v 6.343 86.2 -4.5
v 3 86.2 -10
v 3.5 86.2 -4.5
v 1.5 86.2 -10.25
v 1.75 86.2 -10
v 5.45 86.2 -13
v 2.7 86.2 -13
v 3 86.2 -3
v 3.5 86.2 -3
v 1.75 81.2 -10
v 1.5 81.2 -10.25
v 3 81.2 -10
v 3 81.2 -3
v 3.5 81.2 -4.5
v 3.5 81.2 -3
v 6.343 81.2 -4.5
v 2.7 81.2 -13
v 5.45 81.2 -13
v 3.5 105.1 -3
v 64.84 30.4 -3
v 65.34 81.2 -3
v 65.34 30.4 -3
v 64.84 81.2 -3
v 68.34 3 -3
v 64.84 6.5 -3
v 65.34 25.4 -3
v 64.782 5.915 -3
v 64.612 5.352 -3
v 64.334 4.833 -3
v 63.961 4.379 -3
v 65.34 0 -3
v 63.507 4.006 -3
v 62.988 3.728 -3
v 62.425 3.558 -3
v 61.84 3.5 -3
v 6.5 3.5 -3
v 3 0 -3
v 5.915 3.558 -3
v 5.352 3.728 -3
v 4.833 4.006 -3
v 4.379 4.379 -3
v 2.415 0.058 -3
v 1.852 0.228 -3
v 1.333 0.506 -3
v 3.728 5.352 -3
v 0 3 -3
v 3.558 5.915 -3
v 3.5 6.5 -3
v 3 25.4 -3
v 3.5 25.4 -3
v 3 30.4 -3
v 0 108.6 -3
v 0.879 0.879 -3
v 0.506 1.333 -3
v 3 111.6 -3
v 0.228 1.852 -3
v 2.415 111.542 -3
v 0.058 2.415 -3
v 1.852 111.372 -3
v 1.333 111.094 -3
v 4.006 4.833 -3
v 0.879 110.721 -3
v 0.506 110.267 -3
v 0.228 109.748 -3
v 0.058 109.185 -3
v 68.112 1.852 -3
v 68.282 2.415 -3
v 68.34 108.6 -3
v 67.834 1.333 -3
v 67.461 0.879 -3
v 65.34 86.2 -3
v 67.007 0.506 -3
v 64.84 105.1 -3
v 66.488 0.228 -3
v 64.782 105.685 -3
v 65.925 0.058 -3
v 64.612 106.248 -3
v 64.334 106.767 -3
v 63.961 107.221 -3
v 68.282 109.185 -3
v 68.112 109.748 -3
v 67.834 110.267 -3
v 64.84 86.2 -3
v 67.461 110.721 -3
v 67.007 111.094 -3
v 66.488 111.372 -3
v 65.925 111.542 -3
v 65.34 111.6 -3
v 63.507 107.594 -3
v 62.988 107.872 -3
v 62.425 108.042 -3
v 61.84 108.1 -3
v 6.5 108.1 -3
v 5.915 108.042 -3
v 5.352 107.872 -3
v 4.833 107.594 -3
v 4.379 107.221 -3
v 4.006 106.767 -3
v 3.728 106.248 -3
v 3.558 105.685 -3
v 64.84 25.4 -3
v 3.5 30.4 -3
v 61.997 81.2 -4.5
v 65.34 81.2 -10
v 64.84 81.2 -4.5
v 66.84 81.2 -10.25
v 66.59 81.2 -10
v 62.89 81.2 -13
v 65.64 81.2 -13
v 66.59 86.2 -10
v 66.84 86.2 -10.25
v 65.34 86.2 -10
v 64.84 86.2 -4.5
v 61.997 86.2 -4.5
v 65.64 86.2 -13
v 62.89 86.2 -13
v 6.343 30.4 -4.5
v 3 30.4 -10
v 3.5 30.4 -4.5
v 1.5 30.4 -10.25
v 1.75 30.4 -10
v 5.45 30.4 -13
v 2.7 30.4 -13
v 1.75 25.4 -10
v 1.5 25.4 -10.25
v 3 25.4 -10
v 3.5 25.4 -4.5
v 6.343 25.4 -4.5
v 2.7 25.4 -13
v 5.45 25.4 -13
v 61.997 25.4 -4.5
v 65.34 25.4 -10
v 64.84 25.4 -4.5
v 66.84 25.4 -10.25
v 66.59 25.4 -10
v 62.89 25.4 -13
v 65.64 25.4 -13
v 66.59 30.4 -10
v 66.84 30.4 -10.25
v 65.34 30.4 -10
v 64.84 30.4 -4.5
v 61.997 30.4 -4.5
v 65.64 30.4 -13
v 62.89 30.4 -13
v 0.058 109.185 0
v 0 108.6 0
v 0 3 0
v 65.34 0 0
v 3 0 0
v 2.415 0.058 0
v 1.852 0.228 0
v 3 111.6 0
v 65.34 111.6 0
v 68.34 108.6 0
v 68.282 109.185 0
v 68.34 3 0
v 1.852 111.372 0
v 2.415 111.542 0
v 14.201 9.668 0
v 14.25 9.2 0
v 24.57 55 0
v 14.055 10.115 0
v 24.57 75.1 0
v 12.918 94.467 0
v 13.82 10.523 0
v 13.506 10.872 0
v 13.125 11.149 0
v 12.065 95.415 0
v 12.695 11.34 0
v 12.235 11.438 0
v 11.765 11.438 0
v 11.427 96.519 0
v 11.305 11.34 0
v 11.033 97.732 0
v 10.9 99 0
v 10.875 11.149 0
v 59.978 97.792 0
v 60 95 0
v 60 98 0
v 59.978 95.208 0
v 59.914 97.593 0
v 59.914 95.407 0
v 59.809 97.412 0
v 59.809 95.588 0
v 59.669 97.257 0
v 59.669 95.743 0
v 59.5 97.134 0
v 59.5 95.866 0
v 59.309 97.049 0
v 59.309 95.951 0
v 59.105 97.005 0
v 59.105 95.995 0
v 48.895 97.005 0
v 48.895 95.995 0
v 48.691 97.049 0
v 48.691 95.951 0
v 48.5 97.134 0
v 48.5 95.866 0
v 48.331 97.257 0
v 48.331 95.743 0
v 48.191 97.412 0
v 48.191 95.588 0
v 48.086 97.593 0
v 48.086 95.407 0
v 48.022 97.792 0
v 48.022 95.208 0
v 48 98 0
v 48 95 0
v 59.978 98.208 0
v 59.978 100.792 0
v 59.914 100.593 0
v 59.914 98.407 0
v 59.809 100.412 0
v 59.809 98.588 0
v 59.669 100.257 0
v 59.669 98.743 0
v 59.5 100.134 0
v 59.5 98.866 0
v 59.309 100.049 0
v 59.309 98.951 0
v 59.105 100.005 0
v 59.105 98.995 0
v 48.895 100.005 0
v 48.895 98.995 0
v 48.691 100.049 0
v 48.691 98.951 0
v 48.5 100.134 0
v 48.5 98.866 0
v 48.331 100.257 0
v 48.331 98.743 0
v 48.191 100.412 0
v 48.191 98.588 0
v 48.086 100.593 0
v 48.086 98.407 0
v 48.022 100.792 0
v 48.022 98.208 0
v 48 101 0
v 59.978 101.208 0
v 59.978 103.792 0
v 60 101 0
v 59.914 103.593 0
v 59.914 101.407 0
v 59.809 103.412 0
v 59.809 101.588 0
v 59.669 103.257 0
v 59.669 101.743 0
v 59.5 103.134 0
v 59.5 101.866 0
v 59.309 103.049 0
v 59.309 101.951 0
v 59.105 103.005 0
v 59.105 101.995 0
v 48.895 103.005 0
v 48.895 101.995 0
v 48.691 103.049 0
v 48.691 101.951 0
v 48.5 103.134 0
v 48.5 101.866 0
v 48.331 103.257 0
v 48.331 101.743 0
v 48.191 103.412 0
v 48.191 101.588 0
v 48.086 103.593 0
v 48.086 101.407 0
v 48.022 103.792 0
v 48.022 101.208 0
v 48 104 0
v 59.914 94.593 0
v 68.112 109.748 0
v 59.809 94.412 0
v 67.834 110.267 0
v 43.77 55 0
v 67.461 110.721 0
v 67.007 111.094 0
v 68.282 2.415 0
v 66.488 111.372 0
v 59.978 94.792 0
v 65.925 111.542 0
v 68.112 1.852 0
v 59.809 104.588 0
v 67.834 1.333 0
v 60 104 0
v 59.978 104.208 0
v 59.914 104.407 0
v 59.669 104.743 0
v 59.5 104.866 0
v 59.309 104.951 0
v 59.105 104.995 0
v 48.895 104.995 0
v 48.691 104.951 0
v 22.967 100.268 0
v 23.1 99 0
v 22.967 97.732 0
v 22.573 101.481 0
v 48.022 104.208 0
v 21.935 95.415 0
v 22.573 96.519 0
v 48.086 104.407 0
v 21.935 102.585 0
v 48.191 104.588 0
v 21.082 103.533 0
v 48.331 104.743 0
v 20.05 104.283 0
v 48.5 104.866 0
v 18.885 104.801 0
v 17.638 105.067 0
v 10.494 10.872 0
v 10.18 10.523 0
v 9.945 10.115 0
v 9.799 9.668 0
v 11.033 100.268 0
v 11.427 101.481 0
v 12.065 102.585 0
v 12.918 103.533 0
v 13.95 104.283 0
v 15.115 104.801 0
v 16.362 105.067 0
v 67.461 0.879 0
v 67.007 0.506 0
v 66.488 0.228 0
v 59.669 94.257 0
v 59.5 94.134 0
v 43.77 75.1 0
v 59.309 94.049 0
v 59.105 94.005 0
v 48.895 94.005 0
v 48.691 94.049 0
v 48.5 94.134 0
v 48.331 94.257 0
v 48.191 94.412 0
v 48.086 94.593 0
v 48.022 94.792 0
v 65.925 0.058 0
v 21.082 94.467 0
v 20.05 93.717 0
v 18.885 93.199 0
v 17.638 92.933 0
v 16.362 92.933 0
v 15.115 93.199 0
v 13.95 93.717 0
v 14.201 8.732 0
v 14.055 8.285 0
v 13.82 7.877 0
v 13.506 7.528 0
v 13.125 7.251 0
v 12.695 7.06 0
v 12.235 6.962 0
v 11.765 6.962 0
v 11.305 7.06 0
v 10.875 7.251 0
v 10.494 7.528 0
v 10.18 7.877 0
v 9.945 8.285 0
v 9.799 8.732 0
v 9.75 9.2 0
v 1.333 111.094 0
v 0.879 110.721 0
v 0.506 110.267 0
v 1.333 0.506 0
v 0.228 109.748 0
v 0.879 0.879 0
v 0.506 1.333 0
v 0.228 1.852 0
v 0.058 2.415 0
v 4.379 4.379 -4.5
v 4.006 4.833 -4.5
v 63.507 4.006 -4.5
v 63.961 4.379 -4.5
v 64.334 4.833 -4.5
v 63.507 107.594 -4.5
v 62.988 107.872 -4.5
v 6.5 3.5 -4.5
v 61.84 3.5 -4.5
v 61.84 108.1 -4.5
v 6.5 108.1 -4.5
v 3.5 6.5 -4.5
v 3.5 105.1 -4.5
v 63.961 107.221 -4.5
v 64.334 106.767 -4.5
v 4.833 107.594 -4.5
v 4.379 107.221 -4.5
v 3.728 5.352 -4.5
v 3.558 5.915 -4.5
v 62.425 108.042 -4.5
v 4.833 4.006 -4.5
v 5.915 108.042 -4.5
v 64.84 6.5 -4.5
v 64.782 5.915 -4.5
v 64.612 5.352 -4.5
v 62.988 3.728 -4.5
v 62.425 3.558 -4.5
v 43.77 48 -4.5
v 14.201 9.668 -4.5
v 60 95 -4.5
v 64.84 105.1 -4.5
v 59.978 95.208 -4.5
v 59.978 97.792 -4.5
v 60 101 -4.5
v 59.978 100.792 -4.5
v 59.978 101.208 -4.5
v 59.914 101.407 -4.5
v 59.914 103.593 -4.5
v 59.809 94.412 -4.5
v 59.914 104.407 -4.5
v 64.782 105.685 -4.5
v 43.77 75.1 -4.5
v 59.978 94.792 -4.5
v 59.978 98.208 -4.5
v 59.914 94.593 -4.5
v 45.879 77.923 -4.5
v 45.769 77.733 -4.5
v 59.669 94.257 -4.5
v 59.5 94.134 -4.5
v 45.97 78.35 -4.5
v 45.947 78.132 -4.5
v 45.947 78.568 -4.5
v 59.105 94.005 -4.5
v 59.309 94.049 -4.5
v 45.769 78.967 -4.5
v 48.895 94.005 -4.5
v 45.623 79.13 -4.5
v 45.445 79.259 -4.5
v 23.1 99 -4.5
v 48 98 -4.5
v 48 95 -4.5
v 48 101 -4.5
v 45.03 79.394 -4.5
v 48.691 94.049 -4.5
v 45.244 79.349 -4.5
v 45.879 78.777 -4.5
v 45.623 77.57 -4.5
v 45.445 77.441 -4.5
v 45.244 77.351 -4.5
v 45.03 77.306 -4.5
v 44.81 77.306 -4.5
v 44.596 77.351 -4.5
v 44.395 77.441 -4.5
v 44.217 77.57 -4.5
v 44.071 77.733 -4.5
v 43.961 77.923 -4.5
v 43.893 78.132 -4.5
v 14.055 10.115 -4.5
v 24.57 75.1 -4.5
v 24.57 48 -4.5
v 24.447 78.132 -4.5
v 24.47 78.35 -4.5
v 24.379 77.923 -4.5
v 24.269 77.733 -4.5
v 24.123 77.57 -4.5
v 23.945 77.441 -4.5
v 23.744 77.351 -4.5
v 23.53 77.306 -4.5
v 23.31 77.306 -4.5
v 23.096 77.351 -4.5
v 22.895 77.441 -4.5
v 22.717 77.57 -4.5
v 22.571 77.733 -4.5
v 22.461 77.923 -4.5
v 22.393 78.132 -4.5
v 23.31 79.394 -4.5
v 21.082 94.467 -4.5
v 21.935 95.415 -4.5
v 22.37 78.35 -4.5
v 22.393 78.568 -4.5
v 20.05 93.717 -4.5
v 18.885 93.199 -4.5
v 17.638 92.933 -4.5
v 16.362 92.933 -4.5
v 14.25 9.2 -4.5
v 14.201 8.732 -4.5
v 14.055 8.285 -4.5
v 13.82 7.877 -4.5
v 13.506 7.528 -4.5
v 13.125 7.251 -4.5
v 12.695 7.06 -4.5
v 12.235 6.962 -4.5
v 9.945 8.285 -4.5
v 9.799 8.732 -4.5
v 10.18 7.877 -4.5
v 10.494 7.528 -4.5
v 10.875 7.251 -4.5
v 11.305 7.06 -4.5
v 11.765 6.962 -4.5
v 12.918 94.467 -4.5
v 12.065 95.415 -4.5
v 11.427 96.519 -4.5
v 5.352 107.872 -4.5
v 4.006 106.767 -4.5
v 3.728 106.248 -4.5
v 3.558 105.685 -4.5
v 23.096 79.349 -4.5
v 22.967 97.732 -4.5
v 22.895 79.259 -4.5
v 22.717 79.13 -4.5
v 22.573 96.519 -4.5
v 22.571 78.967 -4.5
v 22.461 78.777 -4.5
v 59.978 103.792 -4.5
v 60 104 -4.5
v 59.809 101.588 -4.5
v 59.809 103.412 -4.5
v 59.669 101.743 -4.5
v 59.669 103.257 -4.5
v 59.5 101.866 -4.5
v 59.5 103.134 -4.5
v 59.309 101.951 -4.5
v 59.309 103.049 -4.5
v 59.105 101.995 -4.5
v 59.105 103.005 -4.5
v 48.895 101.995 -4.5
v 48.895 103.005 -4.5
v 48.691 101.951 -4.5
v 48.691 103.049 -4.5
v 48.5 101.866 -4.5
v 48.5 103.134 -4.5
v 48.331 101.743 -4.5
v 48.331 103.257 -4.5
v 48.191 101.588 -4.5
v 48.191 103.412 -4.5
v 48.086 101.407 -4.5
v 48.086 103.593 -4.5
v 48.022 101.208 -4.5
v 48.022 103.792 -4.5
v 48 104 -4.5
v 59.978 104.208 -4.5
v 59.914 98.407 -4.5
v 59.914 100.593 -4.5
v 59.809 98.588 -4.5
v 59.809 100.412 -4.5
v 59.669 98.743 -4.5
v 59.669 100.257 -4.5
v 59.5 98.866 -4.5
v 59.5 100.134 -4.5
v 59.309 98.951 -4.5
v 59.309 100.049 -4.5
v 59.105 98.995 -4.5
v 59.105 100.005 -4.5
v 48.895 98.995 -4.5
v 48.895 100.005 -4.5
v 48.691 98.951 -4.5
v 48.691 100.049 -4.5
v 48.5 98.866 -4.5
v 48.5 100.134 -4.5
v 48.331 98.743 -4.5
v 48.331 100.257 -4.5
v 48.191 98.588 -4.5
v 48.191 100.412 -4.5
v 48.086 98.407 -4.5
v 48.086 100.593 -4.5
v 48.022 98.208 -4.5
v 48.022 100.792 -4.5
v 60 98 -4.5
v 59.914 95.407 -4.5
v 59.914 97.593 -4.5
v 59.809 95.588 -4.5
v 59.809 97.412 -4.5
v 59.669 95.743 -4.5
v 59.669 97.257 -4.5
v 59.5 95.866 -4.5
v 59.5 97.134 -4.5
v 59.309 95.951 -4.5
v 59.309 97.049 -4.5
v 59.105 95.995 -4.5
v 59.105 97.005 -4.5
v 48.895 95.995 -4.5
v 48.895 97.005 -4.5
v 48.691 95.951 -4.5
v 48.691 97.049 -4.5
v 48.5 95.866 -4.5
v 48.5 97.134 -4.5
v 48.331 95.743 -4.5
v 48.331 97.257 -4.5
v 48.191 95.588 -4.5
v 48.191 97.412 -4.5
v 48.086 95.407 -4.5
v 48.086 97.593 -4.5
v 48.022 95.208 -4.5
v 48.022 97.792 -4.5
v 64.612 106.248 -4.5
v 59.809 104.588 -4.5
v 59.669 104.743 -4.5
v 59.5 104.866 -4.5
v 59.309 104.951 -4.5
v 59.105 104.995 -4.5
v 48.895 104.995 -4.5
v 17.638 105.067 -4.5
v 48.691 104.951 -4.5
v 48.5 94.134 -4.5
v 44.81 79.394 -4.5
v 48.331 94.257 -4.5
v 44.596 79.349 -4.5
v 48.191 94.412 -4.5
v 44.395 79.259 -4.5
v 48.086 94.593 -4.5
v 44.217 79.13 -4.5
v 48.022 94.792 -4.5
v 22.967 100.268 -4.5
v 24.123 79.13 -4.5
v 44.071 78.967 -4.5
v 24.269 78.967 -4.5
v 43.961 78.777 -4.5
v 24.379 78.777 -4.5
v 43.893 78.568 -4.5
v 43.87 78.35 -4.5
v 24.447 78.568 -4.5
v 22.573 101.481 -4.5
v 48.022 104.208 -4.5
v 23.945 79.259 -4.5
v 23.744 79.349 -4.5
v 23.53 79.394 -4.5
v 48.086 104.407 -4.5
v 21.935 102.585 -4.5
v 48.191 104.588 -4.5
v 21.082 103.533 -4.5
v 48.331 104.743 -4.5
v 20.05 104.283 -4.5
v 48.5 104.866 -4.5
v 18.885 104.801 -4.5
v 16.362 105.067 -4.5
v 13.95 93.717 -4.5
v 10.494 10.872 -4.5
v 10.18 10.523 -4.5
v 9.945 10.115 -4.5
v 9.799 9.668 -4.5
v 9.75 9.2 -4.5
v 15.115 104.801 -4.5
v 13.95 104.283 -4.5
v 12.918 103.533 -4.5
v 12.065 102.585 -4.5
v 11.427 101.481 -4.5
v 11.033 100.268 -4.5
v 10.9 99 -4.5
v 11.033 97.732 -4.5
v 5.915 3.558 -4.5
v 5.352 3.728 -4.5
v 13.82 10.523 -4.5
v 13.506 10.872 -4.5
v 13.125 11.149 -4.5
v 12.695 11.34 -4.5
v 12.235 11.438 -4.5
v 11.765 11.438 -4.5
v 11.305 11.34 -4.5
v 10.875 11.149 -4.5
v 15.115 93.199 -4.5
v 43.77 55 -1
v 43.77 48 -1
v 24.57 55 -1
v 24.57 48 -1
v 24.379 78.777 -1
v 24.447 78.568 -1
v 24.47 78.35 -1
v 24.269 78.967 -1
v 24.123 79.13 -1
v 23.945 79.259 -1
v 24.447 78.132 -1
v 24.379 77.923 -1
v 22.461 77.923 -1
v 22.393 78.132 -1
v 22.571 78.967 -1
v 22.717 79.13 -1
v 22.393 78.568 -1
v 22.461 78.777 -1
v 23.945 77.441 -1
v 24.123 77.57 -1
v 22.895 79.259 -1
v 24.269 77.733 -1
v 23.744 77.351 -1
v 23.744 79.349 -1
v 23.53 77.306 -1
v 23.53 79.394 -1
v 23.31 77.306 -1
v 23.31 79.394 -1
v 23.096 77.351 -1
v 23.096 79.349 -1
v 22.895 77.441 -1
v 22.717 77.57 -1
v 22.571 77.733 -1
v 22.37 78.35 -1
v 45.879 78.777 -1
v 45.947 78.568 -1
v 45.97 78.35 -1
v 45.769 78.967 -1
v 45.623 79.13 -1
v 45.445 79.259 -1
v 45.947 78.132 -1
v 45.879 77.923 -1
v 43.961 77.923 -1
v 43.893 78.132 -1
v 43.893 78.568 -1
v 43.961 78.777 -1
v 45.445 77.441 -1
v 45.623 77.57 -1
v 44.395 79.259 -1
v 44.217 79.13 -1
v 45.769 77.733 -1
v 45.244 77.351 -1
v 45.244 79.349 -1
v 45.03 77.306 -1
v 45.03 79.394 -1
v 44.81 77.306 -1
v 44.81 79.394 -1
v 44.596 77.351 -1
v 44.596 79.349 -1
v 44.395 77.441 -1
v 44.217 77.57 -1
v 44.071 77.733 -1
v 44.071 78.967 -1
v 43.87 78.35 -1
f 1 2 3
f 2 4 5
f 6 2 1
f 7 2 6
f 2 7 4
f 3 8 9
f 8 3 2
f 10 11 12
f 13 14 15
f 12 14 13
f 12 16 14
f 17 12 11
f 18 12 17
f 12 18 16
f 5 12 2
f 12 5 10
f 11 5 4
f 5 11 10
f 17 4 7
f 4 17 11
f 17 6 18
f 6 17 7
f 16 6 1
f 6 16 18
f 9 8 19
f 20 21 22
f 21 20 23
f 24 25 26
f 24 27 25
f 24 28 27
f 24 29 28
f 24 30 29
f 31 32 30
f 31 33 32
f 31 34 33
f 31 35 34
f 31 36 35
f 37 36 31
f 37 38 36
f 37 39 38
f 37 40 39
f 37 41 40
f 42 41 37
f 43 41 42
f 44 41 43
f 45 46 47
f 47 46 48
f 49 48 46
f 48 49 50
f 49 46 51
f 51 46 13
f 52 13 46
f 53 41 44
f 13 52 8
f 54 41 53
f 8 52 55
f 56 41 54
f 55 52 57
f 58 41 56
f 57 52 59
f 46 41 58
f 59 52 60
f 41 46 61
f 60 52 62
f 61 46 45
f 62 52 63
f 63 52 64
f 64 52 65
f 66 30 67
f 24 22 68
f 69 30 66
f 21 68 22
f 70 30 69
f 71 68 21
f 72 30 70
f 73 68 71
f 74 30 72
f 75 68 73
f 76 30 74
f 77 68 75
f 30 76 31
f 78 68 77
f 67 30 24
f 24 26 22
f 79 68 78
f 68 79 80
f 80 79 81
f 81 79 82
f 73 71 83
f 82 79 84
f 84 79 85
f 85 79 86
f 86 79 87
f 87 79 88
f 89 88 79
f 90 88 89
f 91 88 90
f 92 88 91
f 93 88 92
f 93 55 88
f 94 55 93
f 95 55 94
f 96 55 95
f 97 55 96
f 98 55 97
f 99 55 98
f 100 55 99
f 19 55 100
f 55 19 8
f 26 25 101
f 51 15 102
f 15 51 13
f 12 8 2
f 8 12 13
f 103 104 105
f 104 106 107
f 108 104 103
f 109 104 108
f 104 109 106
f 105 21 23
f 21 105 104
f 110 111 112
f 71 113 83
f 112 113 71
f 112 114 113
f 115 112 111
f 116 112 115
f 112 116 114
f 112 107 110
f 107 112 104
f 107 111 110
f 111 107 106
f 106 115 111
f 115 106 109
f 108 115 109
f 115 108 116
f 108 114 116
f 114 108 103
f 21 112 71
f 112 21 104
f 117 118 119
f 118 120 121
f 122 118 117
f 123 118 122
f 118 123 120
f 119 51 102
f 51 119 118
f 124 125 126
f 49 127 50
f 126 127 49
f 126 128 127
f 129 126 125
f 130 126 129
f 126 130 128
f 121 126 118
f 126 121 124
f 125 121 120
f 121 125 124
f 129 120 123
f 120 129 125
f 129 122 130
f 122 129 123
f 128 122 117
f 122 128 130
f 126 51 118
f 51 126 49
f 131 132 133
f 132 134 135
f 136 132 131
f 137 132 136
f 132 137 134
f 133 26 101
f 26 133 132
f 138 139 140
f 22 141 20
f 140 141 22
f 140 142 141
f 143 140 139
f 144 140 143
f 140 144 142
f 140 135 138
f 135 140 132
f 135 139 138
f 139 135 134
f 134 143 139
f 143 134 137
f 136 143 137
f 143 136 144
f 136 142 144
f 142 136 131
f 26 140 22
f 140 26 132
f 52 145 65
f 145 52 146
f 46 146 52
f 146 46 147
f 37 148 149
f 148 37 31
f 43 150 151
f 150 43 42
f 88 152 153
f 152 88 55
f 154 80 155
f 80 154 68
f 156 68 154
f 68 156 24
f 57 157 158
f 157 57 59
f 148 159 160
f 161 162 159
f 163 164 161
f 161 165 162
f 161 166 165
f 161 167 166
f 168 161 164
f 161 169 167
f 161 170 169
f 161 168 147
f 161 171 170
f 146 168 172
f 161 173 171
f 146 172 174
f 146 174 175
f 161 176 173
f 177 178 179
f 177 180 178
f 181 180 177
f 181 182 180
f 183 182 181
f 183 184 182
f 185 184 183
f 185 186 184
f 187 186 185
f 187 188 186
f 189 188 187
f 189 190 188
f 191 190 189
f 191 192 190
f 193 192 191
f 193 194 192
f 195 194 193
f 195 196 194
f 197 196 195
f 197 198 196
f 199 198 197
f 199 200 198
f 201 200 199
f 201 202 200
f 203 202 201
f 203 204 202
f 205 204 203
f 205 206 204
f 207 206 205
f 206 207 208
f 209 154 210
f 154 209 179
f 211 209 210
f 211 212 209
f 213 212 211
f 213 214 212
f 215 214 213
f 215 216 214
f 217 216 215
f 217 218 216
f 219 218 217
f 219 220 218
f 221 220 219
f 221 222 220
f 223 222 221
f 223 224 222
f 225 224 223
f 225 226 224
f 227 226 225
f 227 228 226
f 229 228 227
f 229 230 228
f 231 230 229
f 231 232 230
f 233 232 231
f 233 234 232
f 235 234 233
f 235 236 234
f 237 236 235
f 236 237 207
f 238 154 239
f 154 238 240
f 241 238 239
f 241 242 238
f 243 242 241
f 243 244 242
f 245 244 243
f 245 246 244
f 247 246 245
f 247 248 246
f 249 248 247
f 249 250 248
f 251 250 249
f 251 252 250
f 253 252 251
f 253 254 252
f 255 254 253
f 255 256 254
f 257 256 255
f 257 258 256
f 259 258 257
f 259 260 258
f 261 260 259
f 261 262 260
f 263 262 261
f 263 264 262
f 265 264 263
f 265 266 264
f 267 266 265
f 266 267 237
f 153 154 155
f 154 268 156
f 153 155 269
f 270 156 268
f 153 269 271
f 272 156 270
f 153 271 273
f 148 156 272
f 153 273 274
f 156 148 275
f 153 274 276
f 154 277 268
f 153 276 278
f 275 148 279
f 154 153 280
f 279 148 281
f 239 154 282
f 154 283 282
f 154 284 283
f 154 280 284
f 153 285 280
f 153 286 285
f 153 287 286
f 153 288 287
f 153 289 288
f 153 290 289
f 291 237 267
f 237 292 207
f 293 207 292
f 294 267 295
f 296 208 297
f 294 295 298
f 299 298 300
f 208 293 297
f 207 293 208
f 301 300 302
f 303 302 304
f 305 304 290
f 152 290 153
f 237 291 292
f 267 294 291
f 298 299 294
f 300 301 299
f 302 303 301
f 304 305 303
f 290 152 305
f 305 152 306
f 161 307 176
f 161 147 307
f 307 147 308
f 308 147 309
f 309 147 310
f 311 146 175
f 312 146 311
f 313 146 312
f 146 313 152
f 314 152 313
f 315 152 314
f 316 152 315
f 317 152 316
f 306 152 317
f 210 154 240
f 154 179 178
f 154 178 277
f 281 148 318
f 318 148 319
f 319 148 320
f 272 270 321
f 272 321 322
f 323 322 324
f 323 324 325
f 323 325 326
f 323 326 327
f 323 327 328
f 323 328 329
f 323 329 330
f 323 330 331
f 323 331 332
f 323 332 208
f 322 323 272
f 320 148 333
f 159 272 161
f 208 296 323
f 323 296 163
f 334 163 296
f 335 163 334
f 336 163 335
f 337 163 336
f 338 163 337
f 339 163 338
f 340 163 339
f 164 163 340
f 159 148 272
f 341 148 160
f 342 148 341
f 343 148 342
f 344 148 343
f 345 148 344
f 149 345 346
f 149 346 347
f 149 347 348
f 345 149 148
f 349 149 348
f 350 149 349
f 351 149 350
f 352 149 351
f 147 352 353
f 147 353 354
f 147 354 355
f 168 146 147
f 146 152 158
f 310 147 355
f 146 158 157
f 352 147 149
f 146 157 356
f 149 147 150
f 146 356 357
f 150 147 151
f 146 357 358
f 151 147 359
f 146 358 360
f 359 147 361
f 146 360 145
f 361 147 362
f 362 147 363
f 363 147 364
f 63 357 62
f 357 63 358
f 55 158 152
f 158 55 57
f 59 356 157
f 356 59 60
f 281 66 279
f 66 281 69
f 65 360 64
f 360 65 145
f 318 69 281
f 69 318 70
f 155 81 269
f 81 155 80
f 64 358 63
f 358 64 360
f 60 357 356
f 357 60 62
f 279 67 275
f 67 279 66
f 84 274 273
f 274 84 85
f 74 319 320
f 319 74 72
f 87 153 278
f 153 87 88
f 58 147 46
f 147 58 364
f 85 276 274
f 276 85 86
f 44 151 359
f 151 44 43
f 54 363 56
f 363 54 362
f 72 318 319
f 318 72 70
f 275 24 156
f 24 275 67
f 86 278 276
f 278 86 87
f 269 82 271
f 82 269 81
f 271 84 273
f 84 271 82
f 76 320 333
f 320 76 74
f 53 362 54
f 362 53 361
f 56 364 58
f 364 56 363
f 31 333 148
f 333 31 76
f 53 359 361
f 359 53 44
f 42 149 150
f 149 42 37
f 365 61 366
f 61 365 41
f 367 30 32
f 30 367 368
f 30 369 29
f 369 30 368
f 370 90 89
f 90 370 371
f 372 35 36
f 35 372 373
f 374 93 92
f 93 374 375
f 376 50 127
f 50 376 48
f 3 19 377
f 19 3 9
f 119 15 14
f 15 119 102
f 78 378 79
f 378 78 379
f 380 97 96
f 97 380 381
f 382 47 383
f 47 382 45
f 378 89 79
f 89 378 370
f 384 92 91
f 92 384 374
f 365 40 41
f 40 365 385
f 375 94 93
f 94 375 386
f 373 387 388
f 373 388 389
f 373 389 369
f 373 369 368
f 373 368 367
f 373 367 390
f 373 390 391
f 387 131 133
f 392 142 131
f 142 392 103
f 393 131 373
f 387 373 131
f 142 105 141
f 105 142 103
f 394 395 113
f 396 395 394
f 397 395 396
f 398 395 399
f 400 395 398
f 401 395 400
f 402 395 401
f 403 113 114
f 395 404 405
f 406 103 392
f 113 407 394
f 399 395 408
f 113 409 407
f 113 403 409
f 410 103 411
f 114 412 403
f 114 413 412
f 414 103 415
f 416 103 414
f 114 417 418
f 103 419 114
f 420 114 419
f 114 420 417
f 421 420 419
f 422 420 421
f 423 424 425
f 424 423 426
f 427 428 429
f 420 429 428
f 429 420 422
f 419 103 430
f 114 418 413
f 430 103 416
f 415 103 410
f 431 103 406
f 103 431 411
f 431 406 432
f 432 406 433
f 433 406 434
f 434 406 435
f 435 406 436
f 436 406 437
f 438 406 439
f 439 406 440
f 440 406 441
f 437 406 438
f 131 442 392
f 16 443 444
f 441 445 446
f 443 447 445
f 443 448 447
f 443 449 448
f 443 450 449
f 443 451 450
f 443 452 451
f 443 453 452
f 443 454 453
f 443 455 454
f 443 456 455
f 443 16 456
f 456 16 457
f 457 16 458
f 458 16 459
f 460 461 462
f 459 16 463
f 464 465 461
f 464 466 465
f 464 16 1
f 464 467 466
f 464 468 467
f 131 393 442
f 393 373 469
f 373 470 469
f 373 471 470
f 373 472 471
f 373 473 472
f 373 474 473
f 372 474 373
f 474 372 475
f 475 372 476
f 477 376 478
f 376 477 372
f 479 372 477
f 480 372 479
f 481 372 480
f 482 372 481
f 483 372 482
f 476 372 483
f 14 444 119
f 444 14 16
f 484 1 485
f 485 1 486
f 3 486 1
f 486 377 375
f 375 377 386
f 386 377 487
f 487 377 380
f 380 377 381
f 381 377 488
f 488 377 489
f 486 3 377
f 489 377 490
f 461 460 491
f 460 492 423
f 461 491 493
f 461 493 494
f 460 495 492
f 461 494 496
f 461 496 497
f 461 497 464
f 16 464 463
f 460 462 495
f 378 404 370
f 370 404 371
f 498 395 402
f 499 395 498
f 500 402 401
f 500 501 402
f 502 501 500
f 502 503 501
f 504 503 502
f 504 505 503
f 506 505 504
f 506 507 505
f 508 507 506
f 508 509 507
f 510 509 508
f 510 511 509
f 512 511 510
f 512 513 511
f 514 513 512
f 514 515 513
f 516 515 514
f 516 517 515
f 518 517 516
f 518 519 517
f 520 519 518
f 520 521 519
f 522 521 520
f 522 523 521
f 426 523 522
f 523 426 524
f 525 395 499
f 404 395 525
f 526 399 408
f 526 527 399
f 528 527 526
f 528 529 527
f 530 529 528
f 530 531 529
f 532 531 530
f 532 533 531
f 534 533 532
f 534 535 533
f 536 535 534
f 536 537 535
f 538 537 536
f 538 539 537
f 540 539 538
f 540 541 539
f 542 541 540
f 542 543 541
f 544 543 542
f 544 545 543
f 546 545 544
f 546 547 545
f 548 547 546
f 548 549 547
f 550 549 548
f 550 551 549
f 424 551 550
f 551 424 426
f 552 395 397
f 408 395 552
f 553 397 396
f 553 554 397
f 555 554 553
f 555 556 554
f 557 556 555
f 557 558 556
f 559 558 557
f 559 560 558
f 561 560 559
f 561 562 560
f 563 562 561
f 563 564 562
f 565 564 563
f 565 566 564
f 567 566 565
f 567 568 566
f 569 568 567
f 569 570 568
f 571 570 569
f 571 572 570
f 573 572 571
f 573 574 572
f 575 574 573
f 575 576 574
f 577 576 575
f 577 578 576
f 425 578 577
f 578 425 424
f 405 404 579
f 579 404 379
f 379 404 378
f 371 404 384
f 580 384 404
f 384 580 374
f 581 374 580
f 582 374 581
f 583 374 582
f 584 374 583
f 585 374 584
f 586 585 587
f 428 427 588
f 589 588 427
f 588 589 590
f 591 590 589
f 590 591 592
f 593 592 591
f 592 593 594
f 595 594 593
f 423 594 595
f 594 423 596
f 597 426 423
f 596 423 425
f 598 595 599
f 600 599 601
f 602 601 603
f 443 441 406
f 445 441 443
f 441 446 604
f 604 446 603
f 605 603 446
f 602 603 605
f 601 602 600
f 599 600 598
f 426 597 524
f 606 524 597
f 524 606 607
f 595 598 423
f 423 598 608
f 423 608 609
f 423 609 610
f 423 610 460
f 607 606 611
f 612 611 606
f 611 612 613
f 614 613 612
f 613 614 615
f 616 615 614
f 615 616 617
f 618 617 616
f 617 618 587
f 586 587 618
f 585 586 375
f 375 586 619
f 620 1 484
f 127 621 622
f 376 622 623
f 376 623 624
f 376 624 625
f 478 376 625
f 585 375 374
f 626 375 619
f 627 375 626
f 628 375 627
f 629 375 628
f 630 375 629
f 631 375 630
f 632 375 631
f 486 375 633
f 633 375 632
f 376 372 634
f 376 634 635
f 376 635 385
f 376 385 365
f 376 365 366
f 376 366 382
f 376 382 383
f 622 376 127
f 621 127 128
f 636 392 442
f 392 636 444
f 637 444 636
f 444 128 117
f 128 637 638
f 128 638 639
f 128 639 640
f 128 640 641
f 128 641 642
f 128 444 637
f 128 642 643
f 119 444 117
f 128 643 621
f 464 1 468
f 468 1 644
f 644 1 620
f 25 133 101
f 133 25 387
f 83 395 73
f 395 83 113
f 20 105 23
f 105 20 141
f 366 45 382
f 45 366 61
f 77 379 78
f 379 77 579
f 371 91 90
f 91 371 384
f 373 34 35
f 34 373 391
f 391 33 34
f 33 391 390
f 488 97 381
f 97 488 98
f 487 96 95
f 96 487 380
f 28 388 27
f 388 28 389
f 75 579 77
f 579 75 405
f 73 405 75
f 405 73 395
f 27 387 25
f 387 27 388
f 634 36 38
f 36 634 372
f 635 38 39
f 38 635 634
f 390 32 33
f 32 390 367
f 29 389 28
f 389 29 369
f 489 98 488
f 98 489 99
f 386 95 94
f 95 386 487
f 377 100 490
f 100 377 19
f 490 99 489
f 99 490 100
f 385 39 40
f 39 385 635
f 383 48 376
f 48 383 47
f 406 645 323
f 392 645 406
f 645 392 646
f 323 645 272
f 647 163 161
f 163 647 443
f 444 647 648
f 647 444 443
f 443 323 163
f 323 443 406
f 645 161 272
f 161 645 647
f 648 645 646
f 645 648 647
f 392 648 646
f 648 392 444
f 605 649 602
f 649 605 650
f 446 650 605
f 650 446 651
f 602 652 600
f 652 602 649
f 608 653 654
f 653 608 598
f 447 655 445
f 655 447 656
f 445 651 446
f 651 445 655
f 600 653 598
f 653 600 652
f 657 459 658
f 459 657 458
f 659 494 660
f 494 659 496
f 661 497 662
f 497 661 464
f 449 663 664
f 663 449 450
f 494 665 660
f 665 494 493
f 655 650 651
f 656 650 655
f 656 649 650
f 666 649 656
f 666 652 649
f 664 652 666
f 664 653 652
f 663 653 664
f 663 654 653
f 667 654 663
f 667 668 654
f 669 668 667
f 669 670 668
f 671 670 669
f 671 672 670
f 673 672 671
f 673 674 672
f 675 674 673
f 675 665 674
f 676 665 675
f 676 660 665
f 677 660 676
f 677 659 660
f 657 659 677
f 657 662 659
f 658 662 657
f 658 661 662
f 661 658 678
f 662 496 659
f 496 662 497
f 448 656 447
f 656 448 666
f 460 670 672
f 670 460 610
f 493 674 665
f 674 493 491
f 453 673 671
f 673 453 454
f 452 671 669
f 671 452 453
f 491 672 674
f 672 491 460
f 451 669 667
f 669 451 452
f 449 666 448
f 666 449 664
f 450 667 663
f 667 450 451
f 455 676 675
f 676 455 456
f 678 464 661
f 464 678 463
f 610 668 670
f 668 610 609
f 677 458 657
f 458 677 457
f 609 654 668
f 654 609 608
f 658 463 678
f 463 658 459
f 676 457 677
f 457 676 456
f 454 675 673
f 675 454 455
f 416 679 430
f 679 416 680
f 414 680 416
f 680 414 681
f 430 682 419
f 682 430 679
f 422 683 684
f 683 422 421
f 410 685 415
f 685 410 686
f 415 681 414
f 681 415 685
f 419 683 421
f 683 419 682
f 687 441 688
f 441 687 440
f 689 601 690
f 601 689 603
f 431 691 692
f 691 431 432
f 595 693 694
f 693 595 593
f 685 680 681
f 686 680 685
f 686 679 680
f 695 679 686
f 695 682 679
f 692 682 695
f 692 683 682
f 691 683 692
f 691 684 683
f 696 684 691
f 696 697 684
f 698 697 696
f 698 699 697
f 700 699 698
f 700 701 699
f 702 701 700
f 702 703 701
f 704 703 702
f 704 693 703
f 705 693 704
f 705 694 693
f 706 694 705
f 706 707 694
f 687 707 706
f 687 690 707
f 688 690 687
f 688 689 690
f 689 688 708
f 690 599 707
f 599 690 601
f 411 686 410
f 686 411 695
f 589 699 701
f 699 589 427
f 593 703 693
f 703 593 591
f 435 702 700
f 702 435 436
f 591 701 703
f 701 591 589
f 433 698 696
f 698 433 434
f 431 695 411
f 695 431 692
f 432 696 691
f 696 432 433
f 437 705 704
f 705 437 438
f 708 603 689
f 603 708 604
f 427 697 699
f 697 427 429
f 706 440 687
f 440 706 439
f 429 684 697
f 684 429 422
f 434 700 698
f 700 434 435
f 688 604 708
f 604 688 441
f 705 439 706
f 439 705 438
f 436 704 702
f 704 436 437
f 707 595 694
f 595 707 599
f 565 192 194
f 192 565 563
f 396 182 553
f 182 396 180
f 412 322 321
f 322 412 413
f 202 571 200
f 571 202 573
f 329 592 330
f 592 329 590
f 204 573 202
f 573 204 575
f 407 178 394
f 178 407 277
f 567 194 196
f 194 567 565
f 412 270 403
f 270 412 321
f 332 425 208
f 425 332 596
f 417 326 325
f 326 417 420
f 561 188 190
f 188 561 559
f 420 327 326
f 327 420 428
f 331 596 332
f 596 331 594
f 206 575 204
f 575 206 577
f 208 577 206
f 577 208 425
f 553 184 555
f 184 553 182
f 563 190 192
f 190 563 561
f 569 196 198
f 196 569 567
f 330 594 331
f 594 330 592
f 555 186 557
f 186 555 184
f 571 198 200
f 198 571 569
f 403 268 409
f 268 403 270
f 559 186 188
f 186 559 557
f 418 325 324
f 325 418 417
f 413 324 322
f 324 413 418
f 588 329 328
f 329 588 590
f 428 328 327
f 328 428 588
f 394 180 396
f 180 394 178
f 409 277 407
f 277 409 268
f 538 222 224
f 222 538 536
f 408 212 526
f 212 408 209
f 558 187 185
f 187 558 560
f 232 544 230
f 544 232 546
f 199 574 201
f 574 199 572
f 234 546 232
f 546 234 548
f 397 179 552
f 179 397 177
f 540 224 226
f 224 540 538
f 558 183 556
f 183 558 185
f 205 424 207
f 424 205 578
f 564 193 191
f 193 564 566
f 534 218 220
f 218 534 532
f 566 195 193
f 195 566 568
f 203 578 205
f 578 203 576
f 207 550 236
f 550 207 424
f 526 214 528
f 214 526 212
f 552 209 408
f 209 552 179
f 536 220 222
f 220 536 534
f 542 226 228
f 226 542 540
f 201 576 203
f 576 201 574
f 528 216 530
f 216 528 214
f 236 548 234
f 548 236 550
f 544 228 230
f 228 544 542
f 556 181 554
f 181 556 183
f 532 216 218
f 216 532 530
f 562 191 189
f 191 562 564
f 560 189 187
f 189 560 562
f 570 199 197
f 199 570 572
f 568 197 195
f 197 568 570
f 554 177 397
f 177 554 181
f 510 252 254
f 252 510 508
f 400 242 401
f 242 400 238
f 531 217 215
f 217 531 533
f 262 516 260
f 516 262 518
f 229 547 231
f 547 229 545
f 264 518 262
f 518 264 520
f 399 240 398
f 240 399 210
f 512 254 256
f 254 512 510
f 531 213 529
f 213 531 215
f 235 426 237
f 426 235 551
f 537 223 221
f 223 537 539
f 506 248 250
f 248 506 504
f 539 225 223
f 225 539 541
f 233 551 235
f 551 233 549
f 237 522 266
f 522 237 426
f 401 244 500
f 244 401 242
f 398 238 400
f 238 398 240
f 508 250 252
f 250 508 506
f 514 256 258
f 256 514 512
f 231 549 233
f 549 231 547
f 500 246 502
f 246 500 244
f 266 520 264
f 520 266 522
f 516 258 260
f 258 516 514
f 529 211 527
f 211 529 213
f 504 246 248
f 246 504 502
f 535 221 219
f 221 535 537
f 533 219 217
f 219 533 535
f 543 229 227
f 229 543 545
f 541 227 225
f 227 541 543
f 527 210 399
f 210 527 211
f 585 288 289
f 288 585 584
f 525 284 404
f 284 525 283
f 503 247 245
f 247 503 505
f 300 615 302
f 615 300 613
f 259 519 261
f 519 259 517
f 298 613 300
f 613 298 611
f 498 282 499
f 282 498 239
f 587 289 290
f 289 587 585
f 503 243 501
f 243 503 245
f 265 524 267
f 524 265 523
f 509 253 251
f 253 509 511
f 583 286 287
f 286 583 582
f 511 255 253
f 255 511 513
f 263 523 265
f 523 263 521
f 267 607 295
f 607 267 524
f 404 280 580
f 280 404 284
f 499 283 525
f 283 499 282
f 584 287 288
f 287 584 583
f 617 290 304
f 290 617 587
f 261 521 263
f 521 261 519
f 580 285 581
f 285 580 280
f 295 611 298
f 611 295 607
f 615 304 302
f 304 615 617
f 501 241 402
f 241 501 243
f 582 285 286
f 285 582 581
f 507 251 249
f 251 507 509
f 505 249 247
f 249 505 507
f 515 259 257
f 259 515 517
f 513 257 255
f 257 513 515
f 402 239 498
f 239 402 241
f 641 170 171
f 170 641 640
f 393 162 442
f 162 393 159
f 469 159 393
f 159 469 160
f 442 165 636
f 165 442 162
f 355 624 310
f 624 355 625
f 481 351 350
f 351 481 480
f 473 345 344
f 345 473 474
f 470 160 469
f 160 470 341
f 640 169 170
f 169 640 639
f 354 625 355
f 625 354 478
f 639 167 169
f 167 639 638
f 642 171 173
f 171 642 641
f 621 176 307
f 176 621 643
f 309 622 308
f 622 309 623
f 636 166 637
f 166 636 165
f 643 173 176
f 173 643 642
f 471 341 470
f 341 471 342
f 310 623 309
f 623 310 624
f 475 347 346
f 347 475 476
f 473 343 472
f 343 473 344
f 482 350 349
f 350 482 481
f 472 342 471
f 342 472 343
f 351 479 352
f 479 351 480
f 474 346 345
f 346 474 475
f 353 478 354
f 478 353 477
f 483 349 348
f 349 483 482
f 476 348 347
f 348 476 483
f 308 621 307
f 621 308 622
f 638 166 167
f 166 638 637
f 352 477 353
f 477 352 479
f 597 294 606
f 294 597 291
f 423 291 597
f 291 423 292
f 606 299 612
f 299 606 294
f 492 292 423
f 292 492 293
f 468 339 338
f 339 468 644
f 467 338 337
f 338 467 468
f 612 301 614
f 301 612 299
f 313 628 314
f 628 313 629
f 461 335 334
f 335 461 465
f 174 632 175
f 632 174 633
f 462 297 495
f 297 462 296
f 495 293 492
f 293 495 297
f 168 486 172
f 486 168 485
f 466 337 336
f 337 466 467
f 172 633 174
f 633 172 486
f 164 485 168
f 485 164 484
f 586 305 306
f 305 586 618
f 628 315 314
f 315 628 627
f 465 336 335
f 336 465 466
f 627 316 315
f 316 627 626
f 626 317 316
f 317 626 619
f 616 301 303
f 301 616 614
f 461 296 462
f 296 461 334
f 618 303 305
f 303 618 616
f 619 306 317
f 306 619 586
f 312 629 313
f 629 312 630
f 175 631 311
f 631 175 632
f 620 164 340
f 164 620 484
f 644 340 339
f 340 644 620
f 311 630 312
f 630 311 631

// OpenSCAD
include <arduino.scad>

// Full nclosure for the Artemis Says project

// model of the board
//arduino(MEGA);

// case
translate([7.5, 5, -14.6-8.3-3]) {
	//enclosure(MEGA, offset=2, heightExtension=3);
}

// total width
enclosure_width = 68.34;
enclosure_height = 111.6;
// including tabs
enclosure_depth = 13;

// make display smaller in the Y direction
display_y_difference = 1;

// size & position of display
display_size_x = 19.2;
display_size_y = 21.1-display_y_difference;
// center X
display_pos_x = (enclosure_width-display_size_x)/2;
display_pos_y = 54+display_y_difference;

// cable on display assembly
display_cable_y = 7;

// size & position of mounting screws for display
display_screw_size_rad = 2.1/2;
display_screw_offset_pos_x = 2.2-display_screw_size_rad;
display_screw_offset_pos_y = 2.2+display_screw_size_rad;

// size & position of reset button
button_size_rad = 4.5/2;
button_pos_x = 12;
button_pos_y = 9.2;

// size & position of buzzer
buzzer_size_rad = 12.2/2;
buzzer_pos_x = 17;
buzzer_pos_y = 99;

// size & position of microphone
mic_size_rad = 1;
mic_pos_x = 46;
mic_pos_y = 95;

// Arrange its children in a regular rectangular array
//      spacing - the space between children origins
//      n       - the number of children along x axis
module arrange(spacing=50, n=5) {
    nparts = $children;
    for(i=[0:1:n-1], j=[0:nparts/n])
        if (i+n*j < nparts)
            translate([spacing*(i+1), spacing*j, 0]) 
                children(i+n*j);
}

// subtract openings from lid
difference() {

// lid
translate([7.5, 5, -3]) {
	enclosureLid(MEGA2560, offset=2);
}

// hole for display
translate([display_pos_x, display_pos_y, -10]) {
	cube([display_size_x, display_size_y, 20]);

    // Z offset here of -14.5 reaches the bottom
    // and Z offset of -10 reaches the top
    // so make a 3.5mm deep hole from the bottom
    screw_offset = -14.5 + 3.5;

    // display cable
    translate([0, -display_cable_y, screw_offset]) {
		cube([display_size_x, display_cable_y, 20]);
	}

	// left screw hole
	translate([-display_screw_offset_pos_x, display_size_y+display_screw_offset_pos_y, screw_offset]) {
		cylinder(r=display_screw_size_rad, h=40, center=true, $fn=30);
	}

	// right screw hole
	translate([display_size_x+display_screw_offset_pos_x, display_size_y+display_screw_offset_pos_y, screw_offset]) {
		cylinder(r=display_screw_size_rad, h=40, center=true, $fn=30);
	}
}

// hole for reset button
translate([button_pos_x, button_pos_y, -10]) {
	cylinder(r=button_size_rad, h=40, center=true, $fn=30);
}

// hole for buzzer
translate([buzzer_pos_x, buzzer_pos_y, -10]) {
	cylinder(r=buzzer_size_rad, h=40, center=true, $fn=30);
}

// hole for microphone
translate([mic_pos_x, mic_pos_y, -10]) {
	arrange(spacing=3, n=1) {
        hull() {
            cylinder(r=mic_size_rad, h=40, center=true, $fn=30);
            translate([10,0,0]) {
                cylinder(r=mic_size_rad, h=40, center=true, $fn=30);
            }
        }
        hull() {
            cylinder(r=mic_size_rad, h=40, center=true, $fn=30);
            translate([10,0,0]) {
                cylinder(r=mic_size_rad, h=40, center=true, $fn=30);
            }
        }
        hull() {
            cylinder(r=mic_size_rad, h=40, center=true, $fn=30);
            translate([10,0,0]) {
                cylinder(r=mic_size_rad, h=40, center=true, $fn=30);
            }
        }
        hull() {
            cylinder(r=mic_size_rad, h=40, center=true, $fn=30);
            translate([10,0,0]) {
                cylinder(r=mic_size_rad, h=40, center=true, $fn=30);
            }
        }
	}
}

}
